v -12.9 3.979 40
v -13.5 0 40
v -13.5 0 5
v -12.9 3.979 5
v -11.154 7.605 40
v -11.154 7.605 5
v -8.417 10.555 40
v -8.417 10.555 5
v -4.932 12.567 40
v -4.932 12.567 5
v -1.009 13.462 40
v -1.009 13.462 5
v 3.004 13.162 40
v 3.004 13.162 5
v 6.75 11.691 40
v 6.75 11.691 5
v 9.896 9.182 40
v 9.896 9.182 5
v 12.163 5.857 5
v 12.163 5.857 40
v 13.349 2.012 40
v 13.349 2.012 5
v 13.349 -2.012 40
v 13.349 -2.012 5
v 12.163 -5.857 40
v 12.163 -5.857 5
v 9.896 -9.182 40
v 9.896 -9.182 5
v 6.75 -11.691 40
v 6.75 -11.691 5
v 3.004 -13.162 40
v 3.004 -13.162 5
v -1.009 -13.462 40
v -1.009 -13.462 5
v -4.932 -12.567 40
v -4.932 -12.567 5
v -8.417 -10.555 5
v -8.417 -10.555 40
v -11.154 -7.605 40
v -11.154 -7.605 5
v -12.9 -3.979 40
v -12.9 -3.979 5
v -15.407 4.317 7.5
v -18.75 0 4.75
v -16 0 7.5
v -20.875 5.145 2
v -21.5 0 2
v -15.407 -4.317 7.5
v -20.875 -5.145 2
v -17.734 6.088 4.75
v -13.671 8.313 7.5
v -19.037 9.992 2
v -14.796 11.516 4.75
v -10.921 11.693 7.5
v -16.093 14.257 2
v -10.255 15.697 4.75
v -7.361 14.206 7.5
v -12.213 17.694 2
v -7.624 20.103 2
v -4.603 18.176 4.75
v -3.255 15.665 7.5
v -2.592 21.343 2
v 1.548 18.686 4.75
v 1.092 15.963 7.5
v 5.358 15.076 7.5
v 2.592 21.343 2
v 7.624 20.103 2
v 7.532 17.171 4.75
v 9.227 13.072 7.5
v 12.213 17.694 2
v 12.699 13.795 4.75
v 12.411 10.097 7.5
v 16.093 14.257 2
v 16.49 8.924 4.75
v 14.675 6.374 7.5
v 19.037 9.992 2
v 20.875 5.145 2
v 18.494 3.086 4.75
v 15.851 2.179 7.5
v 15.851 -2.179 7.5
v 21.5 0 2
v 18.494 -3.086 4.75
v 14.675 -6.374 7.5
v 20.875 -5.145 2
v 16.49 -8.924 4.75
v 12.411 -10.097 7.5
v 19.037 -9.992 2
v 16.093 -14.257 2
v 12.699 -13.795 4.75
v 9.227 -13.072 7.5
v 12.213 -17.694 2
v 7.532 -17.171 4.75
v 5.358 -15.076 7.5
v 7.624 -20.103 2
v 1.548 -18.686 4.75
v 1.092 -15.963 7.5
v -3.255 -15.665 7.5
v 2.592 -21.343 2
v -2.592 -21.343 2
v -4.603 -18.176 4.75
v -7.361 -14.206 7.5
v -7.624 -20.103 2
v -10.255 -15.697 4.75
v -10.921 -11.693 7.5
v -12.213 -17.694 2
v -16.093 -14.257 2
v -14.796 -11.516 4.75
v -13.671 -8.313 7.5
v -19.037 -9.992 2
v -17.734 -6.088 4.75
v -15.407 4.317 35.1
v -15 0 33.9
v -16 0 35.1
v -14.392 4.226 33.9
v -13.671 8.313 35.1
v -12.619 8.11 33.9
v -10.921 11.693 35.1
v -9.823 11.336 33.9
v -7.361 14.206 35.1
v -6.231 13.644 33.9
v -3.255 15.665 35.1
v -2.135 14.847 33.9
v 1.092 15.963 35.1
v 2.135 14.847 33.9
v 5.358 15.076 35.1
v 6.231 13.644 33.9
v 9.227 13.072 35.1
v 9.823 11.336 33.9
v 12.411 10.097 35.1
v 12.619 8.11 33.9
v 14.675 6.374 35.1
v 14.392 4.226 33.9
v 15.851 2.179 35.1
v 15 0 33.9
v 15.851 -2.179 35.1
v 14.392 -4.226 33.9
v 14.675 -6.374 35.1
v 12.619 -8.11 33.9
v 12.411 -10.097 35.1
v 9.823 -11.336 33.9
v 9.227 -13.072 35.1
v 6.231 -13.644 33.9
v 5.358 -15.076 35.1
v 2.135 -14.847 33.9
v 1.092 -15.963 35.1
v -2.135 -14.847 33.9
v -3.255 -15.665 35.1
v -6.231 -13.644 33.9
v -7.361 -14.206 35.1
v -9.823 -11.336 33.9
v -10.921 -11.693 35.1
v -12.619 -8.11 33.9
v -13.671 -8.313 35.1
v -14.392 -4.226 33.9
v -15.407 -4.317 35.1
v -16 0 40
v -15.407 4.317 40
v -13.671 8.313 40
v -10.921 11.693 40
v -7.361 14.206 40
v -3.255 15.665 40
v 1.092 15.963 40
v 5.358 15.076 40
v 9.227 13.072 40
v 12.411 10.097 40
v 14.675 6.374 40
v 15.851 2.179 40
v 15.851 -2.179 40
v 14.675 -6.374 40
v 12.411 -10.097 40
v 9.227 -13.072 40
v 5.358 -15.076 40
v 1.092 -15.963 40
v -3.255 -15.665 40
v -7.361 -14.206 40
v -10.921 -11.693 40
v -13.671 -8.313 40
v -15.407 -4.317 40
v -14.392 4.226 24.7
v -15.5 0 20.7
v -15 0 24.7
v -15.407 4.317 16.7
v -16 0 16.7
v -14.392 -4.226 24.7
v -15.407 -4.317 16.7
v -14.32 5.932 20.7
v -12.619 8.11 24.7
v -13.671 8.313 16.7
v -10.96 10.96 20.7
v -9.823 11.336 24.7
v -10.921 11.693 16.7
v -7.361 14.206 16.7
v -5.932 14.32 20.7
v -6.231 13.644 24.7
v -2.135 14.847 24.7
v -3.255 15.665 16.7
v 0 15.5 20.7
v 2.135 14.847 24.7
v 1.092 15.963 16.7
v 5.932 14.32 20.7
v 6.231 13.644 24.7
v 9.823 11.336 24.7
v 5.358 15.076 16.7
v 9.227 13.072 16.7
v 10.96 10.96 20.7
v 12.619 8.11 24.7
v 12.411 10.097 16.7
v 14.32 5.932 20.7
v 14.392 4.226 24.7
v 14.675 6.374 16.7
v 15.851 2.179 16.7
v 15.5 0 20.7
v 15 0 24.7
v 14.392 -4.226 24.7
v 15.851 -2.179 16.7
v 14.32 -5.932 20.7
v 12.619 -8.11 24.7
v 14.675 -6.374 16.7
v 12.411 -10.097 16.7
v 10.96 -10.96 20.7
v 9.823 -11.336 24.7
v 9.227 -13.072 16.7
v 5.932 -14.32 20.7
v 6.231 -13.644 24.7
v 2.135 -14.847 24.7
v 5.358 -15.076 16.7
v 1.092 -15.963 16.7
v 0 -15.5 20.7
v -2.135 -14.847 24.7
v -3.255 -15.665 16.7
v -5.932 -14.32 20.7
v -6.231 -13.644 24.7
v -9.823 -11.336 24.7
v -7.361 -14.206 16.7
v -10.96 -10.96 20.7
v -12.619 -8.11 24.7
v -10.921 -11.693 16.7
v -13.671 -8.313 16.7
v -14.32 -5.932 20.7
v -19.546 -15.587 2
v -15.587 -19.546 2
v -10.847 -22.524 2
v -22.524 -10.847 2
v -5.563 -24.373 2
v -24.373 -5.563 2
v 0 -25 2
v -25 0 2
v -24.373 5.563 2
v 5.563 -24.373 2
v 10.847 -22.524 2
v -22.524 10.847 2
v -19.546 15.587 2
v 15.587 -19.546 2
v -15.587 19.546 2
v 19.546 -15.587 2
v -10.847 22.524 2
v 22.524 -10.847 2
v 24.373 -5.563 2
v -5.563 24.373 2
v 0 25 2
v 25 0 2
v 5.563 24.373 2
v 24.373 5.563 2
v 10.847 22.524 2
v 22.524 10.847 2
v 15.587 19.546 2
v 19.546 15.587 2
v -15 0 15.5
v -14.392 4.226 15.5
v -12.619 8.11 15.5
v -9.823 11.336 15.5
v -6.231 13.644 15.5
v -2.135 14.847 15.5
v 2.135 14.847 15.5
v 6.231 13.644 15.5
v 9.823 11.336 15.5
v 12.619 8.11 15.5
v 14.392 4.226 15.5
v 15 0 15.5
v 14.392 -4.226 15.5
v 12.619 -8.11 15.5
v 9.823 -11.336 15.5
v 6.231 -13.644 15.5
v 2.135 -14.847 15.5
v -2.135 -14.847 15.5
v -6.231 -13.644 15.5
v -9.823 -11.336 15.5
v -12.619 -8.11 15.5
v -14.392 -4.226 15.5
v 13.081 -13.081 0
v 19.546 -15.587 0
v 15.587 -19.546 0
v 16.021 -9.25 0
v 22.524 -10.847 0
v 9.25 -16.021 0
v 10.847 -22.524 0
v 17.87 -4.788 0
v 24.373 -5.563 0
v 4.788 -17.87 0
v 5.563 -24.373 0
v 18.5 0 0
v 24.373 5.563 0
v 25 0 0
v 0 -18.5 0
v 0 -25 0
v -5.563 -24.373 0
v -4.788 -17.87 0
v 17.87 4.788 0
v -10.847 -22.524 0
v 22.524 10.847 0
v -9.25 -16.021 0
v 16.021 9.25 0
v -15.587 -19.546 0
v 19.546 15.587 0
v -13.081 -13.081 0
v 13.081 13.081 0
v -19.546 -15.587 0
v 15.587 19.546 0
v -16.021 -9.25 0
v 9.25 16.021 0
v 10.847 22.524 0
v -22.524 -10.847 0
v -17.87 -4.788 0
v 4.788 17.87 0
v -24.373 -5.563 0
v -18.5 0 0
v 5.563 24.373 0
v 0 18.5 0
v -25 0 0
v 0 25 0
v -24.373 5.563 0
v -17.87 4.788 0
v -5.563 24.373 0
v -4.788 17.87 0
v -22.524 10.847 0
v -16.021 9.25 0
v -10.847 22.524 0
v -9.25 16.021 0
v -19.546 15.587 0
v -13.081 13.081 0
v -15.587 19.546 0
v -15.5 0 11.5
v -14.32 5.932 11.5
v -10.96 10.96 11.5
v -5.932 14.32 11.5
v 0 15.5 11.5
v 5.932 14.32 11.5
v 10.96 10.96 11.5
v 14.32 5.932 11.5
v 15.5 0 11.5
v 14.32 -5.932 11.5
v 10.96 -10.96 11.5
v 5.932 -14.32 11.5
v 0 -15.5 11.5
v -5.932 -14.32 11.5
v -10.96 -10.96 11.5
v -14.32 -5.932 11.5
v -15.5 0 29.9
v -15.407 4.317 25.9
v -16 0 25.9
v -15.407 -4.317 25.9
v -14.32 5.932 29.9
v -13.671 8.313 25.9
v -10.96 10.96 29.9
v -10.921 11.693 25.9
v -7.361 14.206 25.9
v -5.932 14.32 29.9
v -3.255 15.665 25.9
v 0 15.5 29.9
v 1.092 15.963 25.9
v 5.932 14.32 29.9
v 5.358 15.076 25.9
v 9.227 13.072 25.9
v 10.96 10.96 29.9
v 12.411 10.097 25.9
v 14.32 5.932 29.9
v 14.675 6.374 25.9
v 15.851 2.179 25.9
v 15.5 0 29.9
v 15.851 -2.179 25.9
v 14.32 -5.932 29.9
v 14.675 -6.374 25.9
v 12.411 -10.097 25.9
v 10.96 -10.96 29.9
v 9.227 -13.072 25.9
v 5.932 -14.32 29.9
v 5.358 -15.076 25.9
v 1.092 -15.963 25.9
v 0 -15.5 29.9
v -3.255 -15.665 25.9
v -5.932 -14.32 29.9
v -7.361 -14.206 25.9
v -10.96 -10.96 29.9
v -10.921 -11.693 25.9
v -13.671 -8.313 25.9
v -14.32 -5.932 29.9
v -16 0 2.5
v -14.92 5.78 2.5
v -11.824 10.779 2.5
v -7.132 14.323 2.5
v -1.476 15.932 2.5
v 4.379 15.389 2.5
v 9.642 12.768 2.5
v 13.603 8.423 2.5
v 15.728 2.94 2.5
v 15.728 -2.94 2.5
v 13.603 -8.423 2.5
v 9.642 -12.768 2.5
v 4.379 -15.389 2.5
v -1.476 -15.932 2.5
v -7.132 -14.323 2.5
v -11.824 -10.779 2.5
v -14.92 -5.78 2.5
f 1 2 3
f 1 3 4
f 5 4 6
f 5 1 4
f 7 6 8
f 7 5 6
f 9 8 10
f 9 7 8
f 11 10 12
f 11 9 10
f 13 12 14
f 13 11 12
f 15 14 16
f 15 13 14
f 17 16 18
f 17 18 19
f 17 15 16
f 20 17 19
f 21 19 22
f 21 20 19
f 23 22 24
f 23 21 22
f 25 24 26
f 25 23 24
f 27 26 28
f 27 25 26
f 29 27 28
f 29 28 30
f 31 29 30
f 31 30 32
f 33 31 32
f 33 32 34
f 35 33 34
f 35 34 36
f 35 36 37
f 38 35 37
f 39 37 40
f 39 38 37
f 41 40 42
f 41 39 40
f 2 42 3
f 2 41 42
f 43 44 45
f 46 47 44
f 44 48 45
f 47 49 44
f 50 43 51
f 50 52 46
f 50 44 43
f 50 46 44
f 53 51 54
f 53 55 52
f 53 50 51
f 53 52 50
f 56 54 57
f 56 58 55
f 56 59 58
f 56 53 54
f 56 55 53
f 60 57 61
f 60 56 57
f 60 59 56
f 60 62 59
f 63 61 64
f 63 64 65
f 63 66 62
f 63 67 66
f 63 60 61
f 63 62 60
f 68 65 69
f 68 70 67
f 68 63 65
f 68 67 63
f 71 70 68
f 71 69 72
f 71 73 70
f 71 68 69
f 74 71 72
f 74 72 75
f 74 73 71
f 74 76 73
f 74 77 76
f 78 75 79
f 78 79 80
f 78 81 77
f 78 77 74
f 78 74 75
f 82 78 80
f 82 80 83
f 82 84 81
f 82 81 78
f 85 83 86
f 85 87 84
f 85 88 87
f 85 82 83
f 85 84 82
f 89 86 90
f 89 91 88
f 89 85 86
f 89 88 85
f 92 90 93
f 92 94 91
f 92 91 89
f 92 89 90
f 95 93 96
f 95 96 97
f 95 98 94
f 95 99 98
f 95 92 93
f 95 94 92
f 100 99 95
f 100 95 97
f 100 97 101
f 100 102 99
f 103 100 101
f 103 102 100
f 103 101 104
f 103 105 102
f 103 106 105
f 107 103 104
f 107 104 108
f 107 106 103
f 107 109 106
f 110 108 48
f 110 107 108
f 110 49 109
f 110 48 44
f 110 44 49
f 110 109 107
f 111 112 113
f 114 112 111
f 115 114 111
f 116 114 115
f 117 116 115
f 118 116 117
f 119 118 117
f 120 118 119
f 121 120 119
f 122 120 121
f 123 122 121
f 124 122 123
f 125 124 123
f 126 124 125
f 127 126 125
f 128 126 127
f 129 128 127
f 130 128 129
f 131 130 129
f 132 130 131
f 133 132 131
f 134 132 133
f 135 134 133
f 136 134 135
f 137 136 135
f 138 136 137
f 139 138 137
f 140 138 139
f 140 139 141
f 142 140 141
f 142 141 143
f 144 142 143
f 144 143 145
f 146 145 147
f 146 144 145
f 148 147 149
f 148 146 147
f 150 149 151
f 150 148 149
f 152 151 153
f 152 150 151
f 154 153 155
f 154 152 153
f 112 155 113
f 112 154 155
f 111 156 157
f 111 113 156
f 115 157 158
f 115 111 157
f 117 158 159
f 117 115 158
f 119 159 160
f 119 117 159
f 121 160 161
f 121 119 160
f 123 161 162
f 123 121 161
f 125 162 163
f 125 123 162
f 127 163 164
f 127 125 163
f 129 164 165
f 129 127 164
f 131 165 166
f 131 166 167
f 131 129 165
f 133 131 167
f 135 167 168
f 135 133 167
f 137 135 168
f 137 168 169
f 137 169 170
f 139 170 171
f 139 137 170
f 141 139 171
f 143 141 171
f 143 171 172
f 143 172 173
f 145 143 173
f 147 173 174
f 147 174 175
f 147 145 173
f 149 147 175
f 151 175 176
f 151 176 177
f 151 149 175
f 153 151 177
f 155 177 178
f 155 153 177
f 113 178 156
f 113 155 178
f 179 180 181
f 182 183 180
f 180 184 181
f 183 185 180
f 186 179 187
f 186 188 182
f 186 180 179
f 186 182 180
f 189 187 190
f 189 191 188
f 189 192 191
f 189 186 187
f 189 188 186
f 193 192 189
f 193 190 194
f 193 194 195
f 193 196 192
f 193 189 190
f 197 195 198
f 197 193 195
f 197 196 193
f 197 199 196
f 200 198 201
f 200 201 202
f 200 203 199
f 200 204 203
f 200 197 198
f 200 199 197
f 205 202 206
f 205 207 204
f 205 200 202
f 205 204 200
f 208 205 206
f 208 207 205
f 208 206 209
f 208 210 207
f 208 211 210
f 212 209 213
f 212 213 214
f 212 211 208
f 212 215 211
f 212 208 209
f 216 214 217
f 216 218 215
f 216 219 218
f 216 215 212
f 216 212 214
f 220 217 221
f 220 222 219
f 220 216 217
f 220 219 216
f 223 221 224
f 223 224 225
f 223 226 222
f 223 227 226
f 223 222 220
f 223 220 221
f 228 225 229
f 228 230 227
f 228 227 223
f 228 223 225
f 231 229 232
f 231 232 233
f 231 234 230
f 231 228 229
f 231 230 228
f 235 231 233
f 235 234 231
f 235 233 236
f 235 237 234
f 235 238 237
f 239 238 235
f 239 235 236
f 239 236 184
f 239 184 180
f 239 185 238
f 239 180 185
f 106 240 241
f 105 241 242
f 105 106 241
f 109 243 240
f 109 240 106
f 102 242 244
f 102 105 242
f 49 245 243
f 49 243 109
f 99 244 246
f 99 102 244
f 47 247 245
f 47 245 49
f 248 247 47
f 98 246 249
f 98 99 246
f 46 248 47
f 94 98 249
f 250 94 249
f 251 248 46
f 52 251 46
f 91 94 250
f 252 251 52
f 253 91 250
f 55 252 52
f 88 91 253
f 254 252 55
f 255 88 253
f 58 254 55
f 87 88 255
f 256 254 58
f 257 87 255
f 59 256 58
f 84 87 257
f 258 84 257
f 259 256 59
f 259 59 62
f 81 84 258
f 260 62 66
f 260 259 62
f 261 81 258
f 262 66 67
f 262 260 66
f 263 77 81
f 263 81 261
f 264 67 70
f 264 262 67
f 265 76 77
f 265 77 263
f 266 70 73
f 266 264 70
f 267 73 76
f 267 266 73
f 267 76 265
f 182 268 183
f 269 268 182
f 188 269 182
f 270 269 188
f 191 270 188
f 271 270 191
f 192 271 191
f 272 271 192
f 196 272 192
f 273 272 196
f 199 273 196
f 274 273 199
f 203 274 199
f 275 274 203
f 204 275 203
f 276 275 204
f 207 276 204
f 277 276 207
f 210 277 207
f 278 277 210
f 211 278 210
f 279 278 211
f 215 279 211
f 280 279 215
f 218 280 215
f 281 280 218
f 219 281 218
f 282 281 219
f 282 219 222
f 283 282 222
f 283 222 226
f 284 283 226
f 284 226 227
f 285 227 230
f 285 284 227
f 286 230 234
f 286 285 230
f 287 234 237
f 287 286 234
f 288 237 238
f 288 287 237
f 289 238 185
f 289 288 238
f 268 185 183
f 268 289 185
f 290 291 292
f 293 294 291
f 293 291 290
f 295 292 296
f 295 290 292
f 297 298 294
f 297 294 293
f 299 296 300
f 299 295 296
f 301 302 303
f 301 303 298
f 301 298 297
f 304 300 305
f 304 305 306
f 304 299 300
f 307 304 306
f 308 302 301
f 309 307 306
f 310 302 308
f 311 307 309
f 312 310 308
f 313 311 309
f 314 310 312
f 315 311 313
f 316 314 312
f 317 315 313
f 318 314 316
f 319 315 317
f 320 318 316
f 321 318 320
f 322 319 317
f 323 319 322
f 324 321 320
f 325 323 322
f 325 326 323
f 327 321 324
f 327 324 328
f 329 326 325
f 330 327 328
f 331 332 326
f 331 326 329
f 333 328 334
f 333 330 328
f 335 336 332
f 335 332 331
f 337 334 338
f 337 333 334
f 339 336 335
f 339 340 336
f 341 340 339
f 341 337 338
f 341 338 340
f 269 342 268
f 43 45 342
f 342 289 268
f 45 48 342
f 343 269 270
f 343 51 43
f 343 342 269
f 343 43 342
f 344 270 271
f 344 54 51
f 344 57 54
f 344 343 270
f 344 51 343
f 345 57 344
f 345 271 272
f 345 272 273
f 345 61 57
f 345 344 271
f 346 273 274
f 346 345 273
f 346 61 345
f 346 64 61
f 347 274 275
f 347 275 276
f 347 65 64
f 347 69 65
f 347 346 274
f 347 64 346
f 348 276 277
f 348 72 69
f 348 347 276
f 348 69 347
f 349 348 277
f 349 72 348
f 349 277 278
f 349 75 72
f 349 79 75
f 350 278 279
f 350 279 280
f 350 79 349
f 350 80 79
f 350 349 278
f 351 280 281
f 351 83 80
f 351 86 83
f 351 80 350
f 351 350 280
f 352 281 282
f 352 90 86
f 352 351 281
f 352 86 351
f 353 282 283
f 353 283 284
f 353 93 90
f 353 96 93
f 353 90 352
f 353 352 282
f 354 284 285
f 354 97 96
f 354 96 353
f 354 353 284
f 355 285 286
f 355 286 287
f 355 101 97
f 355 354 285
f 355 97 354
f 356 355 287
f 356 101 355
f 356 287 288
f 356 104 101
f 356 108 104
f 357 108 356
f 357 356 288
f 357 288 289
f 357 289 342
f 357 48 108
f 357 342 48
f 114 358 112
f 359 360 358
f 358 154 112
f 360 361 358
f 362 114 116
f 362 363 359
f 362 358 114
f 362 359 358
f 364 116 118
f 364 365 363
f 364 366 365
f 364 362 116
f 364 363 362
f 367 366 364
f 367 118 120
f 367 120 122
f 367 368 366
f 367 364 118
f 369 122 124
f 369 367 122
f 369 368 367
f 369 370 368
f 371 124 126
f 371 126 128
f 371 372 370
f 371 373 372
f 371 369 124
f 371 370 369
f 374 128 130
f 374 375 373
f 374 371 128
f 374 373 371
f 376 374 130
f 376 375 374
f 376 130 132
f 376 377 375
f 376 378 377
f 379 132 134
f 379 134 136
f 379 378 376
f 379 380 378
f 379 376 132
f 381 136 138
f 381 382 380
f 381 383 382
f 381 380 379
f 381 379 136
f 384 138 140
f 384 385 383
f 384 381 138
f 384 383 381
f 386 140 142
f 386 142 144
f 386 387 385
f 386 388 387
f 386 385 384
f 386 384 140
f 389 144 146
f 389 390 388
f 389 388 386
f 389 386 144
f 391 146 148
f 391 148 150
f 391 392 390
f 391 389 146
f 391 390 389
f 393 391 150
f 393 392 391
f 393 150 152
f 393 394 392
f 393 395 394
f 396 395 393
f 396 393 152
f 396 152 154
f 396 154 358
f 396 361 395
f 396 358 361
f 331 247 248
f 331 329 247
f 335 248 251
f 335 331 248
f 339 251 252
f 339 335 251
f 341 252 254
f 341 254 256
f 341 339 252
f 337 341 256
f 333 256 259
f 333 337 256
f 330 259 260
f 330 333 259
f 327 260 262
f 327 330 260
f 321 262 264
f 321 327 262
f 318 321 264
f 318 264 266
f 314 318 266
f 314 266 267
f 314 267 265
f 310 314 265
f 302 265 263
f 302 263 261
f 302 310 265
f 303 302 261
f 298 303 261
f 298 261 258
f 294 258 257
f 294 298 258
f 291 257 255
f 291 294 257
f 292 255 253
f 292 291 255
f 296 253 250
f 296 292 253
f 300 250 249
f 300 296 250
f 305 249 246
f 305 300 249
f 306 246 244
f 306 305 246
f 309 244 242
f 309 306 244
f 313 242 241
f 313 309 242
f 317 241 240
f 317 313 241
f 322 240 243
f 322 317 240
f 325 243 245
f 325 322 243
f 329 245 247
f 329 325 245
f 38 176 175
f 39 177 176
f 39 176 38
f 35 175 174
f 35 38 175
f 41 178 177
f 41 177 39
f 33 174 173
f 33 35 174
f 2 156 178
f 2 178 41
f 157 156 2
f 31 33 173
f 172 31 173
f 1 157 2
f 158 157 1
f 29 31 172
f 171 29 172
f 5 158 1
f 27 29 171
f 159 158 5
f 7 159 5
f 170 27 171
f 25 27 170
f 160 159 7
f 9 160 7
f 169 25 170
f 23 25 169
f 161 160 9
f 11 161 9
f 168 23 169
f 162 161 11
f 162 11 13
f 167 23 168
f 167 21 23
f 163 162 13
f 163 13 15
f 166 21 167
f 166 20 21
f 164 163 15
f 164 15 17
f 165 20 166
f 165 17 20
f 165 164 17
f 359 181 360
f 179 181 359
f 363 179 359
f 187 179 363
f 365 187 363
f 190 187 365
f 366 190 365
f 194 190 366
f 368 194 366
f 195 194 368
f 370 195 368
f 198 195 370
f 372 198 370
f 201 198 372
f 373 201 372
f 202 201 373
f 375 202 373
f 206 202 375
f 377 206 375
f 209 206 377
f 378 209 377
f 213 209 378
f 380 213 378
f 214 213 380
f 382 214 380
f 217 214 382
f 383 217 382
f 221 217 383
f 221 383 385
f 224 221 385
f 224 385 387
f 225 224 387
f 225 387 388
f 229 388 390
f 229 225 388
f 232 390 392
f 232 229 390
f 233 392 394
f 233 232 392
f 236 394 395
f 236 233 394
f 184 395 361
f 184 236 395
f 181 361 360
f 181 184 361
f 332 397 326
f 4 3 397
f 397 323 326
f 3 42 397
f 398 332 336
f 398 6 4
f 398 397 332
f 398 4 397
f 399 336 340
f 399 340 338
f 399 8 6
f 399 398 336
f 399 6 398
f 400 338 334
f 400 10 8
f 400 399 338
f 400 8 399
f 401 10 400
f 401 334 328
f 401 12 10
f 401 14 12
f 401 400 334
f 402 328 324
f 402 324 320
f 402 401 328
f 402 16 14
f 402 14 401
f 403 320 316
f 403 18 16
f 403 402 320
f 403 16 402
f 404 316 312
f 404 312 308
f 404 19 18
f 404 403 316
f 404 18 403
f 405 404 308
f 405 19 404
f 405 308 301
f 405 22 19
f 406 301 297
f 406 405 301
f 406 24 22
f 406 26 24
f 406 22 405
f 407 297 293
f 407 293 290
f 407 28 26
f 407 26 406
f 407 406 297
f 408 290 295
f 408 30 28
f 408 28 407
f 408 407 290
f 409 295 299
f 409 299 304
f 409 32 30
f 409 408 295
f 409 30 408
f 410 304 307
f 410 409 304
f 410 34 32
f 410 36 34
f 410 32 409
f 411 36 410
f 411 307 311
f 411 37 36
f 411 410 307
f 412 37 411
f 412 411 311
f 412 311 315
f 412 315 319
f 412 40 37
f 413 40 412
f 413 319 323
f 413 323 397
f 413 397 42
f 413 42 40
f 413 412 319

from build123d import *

# Parameters (mm, degrees)
F2_SIZE = 5


with BuildPart() as f1:
    # F0 (on Front) → F1 (revolve)
    with BuildSketch(Plane.XZ):
        Polygon((-25, 0), (-13.5, 0), (-13.5, 40), (-16, 40), (-16, 35.1), (-15, 33.9), (-16, 25.9), (-15, 24.7), (-16, 16.7), (-15, 15.5), (-16, 7.5), (-21.5, 2), (-25, 2), align=None)
    revolve(axis=Axis((0, 0, -0.481866), (0, 0, -1)))

    # F2
    f2_edges = [f1.edges().sort_by_distance(p)[0] for p in [
        (13.5, 0, 0),
    ]]
    chamfer(f2_edges, length=F2_SIZE)


solid = f1.part
